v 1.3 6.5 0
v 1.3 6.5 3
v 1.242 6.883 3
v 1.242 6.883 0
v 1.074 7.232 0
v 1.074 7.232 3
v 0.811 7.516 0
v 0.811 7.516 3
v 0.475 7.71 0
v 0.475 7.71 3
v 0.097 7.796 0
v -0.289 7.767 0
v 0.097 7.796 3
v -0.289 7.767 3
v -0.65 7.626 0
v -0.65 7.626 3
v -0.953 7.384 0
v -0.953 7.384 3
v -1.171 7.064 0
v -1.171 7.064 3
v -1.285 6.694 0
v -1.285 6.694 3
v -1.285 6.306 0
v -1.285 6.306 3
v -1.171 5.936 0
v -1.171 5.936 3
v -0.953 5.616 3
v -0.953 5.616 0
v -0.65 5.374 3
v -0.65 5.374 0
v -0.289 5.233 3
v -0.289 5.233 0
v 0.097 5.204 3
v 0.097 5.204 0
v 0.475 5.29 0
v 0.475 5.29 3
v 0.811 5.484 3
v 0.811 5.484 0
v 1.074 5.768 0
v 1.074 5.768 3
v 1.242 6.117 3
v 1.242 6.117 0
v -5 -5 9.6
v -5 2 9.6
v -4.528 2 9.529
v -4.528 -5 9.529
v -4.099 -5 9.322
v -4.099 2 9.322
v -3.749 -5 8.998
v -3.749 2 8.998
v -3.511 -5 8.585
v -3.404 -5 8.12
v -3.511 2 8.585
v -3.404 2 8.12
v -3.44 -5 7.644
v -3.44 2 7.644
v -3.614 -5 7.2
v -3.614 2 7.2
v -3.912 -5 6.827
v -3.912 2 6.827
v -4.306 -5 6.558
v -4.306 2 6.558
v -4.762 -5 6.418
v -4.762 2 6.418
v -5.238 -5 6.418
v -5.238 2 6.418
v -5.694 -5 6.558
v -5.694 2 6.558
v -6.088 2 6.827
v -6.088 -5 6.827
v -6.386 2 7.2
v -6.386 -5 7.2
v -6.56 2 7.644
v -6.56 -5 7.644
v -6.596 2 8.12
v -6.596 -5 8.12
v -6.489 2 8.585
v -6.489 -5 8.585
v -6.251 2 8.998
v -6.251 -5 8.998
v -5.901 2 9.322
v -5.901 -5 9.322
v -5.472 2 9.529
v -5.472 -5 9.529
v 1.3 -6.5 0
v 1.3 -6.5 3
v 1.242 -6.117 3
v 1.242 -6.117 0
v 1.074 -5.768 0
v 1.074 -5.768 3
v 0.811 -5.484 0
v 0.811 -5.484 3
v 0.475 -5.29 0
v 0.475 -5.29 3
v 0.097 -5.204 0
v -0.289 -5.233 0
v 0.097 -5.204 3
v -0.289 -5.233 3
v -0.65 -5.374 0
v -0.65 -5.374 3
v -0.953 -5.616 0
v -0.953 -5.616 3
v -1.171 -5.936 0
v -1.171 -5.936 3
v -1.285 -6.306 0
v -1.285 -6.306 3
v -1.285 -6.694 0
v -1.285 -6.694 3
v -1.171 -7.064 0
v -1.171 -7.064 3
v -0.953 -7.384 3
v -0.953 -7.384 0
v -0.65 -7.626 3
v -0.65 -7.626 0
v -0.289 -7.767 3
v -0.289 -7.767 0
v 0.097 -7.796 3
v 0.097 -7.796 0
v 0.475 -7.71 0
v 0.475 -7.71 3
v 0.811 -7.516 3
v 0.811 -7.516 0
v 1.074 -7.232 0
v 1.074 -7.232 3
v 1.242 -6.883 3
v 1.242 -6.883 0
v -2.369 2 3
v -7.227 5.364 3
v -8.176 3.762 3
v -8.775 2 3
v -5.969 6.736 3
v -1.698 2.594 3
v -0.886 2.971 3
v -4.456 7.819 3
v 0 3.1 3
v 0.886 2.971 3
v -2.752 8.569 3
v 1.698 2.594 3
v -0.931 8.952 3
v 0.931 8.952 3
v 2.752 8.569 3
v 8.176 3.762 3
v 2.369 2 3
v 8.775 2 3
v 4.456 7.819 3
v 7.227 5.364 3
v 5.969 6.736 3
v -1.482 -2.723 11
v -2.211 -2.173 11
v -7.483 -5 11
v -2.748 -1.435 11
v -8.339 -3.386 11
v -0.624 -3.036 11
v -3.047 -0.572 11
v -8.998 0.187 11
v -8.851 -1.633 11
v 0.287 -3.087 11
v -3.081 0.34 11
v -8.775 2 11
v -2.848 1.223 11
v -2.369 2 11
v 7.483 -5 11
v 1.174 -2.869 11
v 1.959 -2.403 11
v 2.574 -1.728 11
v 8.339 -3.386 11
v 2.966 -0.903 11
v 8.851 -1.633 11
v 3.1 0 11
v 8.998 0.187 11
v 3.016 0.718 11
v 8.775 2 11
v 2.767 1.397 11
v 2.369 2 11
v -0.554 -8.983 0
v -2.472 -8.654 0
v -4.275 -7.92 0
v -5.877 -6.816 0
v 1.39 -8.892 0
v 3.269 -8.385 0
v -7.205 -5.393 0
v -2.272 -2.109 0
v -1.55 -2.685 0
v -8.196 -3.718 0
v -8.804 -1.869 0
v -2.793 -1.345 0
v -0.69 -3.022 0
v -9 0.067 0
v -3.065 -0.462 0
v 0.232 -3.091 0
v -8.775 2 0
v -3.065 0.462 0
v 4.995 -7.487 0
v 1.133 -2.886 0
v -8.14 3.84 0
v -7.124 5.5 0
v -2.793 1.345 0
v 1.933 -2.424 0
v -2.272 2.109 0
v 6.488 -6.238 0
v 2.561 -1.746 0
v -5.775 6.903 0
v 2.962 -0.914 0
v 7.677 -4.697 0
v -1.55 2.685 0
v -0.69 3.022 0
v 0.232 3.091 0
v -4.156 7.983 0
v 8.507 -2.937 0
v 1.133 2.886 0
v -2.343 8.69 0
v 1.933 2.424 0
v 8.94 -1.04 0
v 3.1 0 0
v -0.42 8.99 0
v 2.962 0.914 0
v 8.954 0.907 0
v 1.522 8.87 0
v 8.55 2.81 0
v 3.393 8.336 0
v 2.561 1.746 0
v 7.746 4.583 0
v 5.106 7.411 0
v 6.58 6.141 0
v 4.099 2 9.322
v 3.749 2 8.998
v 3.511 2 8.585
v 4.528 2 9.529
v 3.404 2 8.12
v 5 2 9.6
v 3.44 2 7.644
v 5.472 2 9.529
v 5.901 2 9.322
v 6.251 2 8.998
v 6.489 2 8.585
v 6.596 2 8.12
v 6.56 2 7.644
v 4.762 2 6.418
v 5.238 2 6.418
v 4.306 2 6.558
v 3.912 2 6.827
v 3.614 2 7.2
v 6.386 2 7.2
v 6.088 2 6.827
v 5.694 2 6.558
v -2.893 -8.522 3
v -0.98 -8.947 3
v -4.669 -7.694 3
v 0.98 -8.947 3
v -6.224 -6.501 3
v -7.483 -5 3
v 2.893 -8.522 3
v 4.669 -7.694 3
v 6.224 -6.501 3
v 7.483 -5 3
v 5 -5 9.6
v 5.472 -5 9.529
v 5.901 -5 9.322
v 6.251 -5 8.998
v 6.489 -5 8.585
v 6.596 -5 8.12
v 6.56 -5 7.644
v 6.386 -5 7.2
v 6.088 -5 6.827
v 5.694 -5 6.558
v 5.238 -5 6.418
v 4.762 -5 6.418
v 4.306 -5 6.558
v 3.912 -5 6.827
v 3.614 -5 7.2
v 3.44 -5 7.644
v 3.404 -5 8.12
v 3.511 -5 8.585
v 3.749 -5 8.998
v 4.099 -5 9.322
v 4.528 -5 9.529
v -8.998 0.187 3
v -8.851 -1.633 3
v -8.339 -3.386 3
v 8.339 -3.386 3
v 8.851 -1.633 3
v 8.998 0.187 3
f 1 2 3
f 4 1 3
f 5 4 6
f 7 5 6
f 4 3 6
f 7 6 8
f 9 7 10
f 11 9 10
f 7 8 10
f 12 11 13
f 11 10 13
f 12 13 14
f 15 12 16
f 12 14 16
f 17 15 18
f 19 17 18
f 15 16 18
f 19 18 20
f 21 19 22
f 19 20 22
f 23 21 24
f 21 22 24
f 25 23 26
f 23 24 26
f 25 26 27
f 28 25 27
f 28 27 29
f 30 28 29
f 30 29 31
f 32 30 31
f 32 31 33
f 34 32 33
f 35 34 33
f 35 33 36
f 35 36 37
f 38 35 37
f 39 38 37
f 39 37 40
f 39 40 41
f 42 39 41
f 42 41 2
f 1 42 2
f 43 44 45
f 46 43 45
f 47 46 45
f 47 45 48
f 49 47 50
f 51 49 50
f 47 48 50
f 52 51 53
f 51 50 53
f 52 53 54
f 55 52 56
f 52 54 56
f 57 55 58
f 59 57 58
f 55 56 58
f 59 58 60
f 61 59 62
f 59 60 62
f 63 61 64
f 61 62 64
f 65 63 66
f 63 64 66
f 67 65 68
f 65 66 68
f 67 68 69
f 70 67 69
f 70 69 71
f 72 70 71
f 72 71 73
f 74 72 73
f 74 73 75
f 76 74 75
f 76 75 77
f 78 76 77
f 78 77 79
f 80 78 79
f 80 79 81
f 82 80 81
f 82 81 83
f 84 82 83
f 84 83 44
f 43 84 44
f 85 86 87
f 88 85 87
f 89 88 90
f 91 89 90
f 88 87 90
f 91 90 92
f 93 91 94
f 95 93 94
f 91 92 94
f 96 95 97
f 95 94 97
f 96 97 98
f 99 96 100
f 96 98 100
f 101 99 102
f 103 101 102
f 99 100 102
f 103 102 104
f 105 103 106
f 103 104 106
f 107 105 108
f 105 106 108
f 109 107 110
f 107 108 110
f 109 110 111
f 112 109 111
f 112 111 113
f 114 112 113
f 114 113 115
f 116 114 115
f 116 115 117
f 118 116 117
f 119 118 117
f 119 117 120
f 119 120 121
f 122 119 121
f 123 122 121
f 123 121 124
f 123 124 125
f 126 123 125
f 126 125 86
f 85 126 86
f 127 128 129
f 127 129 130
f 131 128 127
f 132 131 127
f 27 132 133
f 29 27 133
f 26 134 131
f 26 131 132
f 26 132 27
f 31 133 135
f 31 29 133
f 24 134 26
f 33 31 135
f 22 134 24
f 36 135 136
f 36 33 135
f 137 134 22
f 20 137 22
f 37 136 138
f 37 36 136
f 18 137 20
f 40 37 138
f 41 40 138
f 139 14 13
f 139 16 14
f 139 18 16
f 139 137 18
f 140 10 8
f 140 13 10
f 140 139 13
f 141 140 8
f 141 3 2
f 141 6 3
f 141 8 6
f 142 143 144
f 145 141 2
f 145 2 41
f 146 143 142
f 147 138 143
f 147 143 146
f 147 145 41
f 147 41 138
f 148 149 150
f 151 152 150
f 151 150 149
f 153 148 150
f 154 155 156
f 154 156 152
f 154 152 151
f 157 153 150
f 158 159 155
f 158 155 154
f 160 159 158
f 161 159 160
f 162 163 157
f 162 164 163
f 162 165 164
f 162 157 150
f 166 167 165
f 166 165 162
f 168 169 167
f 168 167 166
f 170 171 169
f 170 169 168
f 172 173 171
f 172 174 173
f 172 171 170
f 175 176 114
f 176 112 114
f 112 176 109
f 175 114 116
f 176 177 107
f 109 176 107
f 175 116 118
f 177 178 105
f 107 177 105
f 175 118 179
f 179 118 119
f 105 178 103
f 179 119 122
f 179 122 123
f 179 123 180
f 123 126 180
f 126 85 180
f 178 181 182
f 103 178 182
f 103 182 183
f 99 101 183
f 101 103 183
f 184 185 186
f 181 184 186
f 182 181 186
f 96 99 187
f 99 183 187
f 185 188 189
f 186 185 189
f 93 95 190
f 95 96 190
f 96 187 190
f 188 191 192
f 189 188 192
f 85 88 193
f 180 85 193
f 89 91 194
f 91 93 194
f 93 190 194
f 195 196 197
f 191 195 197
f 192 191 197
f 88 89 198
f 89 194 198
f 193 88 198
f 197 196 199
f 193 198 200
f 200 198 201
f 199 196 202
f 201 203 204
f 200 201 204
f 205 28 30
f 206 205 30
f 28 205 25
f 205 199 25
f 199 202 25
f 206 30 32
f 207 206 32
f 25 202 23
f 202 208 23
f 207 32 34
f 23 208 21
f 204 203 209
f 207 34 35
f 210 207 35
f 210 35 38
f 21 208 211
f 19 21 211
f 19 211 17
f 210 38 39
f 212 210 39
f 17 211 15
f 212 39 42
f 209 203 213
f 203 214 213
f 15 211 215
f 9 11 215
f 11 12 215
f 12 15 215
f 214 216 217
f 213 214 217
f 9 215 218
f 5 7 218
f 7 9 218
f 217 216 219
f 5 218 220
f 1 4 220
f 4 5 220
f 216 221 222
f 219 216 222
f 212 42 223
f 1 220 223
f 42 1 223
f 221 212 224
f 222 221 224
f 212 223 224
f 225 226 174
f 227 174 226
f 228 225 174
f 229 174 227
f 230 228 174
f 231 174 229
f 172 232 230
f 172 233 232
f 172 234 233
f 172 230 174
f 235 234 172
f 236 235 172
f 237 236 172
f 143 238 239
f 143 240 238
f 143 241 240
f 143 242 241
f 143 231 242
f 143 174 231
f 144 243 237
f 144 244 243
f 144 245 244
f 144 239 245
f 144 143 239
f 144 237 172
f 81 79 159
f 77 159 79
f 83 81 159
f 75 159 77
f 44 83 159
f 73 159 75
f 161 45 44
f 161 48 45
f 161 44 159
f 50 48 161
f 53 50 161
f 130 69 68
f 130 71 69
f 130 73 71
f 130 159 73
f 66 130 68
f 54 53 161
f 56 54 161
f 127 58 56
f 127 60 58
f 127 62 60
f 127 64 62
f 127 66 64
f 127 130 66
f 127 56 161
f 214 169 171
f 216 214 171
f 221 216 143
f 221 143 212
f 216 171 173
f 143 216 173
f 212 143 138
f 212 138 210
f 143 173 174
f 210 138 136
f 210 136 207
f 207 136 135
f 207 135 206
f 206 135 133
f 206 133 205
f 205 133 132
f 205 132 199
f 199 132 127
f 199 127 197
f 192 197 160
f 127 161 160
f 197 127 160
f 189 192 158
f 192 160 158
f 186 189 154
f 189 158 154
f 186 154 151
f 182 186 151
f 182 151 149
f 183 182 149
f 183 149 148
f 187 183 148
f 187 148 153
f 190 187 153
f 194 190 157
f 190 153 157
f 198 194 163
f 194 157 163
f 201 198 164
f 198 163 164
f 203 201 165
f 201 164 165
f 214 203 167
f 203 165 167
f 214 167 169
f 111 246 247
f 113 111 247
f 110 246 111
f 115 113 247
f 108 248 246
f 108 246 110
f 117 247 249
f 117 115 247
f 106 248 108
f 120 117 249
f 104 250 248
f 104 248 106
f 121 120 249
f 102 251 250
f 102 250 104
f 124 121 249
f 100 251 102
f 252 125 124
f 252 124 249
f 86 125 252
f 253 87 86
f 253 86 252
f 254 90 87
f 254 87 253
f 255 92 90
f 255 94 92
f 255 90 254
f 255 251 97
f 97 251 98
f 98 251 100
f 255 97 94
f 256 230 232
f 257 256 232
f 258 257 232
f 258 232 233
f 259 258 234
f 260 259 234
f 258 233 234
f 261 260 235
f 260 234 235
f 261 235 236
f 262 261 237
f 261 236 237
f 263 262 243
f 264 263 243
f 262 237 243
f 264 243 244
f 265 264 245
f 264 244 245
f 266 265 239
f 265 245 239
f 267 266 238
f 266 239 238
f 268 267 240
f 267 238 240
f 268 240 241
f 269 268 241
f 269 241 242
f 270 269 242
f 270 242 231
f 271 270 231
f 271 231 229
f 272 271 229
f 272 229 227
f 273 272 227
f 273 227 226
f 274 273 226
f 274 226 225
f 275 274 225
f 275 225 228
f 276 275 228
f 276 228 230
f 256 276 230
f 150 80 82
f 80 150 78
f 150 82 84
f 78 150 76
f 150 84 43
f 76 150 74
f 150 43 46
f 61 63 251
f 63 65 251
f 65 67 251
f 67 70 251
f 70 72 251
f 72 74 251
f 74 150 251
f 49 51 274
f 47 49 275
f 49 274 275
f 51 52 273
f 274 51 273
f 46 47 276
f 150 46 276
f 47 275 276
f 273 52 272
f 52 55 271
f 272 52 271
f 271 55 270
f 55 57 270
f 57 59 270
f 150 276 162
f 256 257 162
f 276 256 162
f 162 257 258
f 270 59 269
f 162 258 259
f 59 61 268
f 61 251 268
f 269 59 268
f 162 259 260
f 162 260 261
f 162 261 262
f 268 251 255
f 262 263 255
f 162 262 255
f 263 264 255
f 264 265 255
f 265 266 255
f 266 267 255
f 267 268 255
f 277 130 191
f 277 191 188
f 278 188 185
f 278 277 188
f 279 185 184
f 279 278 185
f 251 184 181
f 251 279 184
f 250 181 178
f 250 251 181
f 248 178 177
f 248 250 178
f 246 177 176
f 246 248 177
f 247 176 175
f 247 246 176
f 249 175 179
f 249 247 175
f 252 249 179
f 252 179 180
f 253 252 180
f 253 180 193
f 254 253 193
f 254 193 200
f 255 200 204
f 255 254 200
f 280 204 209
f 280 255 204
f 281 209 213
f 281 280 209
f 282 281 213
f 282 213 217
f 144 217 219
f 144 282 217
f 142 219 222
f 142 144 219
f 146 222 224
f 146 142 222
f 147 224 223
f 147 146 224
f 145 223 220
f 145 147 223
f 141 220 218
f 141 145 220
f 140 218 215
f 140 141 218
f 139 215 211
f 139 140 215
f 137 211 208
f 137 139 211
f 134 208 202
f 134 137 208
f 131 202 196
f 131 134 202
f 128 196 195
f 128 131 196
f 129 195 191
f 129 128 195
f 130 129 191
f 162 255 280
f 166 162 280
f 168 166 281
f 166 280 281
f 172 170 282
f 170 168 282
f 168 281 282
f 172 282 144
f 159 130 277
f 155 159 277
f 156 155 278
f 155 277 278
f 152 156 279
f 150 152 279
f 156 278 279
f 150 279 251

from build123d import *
from build123d.topology import SkipClean

# Parameters (mm, degrees)
SKETCH_1_R          = 9.5
EXTRUDE_1_DEPTH     = 3
SKETCH_3_R          = 9
EXTRUDE_2_DEPTH     = 13
CUT_EXTRUDE_START   = -13
CUT_EXTRUDE_2_DEPTH = 13
SKETCH_5_R          = 3.1
CUT_EXTRUDE_3_DEPTH = 20
SKETCH_6_R          = 1.6
CUT_EXTRUDE_4_DEPTH = 20
SKETCH_7_R          = 1.3
CUT_EXTRUDE_5_DEPTH = 20
CUT_EXTRUDE_START_2 = -5
SKETCH_8_R          = 9
CUT_EXTRUDE_6_DEPTH = 5
SKETCH_9_OUTSIDE_W  = 26.806
SKETCH_9_OUTSIDE_H  = 26.806
SKETCH_9_OUTSIDE_R  = 9
CUT_EXTRUDE_7_DEPTH = 13


with BuildPart() as part:
    # 草图1 → 凸台-拉伸1 (new body)
    with BuildSketch(Plane.XY):
        Circle(SKETCH_1_R)
    extrude(amount=EXTRUDE_1_DEPTH)

    # 草图3 → 凸台-拉伸2 (add)
    with BuildSketch(Plane.XY.offset(3)):
        with Locations(Location((0, 0, 0), (0, 0, 180))):
            Circle(SKETCH_3_R)
    extrude(amount=EXTRUDE_2_DEPTH)

    # 草图4 → 切除-拉伸2 (cut)
    with BuildSketch(Plane.XY.offset(16).offset(CUT_EXTRUDE_START)):
        with BuildLine():
            Line((-8.774964387, 2), (8.774964387, 2))
            ThreePointArc((8.774964387, 2), (0, 9), (-8.774964387, 2))
        make_face()
        with BuildLine():
            Line((-7.483314774, -5), (7.483314774, -5))
            ThreePointArc((7.483314774, -5), (0, -9), (-7.483314774, -5))
        make_face()
    extrude(amount=CUT_EXTRUDE_2_DEPTH, mode=Mode.SUBTRACT)

    # 草图5 → 切除-拉伸3 (cut)
    with BuildSketch(Plane.XY.offset(16)):
        Circle(SKETCH_5_R)
    extrude(amount=-CUT_EXTRUDE_3_DEPTH, mode=Mode.SUBTRACT)

    # 草图6 → 切除-拉伸4 (cut)
    with BuildSketch(Plane(origin=(0, 2, 0), x_dir=(1, 0, 0), z_dir=(0, 1, 0))):
        with Locations(Location((-5, -8, 0), (0, 0, 270))):
            Circle(SKETCH_6_R)
        with Locations(Location((5, -8, 0), (0, 0, 270))):
            Circle(SKETCH_6_R)
        with Locations(Location((0, -14, 0), (0, 0, 270))):
            Circle(SKETCH_6_R)
    extrude(amount=-CUT_EXTRUDE_4_DEPTH, mode=Mode.SUBTRACT)

    # 草图7 → 切除-拉伸5 (cut)
    with BuildSketch(Plane.XY.offset(3)):
        with Locations((0, 6.5)):
            Circle(SKETCH_7_R)
        with Locations((0, -6.5)):
            Circle(SKETCH_7_R)
    extrude(amount=-CUT_EXTRUDE_5_DEPTH, mode=Mode.SUBTRACT)

    # 草图8 → 切除-拉伸6 (cut)
    with BuildSketch(Plane.XY.offset(16).offset(CUT_EXTRUDE_START_2)):
        Circle(SKETCH_8_R)
    extrude(amount=CUT_EXTRUDE_6_DEPTH, mode=Mode.SUBTRACT)

    # 草图9 outside → 切除-拉伸7 (cut)
    with SkipClean():  # the faces are left unmerged after this step: merging them gives an invalid solid
        with BuildSketch(Plane.XY.offset(3)):
            Rectangle(SKETCH_9_OUTSIDE_W, SKETCH_9_OUTSIDE_H)
            with Locations(Location((0, 0, 0), (0, 0, 167.160411593))):
                Circle(SKETCH_9_OUTSIDE_R, mode=Mode.SUBTRACT)
        extrude(amount=-CUT_EXTRUDE_7_DEPTH, mode=Mode.SUBTRACT)


solid = part.part
